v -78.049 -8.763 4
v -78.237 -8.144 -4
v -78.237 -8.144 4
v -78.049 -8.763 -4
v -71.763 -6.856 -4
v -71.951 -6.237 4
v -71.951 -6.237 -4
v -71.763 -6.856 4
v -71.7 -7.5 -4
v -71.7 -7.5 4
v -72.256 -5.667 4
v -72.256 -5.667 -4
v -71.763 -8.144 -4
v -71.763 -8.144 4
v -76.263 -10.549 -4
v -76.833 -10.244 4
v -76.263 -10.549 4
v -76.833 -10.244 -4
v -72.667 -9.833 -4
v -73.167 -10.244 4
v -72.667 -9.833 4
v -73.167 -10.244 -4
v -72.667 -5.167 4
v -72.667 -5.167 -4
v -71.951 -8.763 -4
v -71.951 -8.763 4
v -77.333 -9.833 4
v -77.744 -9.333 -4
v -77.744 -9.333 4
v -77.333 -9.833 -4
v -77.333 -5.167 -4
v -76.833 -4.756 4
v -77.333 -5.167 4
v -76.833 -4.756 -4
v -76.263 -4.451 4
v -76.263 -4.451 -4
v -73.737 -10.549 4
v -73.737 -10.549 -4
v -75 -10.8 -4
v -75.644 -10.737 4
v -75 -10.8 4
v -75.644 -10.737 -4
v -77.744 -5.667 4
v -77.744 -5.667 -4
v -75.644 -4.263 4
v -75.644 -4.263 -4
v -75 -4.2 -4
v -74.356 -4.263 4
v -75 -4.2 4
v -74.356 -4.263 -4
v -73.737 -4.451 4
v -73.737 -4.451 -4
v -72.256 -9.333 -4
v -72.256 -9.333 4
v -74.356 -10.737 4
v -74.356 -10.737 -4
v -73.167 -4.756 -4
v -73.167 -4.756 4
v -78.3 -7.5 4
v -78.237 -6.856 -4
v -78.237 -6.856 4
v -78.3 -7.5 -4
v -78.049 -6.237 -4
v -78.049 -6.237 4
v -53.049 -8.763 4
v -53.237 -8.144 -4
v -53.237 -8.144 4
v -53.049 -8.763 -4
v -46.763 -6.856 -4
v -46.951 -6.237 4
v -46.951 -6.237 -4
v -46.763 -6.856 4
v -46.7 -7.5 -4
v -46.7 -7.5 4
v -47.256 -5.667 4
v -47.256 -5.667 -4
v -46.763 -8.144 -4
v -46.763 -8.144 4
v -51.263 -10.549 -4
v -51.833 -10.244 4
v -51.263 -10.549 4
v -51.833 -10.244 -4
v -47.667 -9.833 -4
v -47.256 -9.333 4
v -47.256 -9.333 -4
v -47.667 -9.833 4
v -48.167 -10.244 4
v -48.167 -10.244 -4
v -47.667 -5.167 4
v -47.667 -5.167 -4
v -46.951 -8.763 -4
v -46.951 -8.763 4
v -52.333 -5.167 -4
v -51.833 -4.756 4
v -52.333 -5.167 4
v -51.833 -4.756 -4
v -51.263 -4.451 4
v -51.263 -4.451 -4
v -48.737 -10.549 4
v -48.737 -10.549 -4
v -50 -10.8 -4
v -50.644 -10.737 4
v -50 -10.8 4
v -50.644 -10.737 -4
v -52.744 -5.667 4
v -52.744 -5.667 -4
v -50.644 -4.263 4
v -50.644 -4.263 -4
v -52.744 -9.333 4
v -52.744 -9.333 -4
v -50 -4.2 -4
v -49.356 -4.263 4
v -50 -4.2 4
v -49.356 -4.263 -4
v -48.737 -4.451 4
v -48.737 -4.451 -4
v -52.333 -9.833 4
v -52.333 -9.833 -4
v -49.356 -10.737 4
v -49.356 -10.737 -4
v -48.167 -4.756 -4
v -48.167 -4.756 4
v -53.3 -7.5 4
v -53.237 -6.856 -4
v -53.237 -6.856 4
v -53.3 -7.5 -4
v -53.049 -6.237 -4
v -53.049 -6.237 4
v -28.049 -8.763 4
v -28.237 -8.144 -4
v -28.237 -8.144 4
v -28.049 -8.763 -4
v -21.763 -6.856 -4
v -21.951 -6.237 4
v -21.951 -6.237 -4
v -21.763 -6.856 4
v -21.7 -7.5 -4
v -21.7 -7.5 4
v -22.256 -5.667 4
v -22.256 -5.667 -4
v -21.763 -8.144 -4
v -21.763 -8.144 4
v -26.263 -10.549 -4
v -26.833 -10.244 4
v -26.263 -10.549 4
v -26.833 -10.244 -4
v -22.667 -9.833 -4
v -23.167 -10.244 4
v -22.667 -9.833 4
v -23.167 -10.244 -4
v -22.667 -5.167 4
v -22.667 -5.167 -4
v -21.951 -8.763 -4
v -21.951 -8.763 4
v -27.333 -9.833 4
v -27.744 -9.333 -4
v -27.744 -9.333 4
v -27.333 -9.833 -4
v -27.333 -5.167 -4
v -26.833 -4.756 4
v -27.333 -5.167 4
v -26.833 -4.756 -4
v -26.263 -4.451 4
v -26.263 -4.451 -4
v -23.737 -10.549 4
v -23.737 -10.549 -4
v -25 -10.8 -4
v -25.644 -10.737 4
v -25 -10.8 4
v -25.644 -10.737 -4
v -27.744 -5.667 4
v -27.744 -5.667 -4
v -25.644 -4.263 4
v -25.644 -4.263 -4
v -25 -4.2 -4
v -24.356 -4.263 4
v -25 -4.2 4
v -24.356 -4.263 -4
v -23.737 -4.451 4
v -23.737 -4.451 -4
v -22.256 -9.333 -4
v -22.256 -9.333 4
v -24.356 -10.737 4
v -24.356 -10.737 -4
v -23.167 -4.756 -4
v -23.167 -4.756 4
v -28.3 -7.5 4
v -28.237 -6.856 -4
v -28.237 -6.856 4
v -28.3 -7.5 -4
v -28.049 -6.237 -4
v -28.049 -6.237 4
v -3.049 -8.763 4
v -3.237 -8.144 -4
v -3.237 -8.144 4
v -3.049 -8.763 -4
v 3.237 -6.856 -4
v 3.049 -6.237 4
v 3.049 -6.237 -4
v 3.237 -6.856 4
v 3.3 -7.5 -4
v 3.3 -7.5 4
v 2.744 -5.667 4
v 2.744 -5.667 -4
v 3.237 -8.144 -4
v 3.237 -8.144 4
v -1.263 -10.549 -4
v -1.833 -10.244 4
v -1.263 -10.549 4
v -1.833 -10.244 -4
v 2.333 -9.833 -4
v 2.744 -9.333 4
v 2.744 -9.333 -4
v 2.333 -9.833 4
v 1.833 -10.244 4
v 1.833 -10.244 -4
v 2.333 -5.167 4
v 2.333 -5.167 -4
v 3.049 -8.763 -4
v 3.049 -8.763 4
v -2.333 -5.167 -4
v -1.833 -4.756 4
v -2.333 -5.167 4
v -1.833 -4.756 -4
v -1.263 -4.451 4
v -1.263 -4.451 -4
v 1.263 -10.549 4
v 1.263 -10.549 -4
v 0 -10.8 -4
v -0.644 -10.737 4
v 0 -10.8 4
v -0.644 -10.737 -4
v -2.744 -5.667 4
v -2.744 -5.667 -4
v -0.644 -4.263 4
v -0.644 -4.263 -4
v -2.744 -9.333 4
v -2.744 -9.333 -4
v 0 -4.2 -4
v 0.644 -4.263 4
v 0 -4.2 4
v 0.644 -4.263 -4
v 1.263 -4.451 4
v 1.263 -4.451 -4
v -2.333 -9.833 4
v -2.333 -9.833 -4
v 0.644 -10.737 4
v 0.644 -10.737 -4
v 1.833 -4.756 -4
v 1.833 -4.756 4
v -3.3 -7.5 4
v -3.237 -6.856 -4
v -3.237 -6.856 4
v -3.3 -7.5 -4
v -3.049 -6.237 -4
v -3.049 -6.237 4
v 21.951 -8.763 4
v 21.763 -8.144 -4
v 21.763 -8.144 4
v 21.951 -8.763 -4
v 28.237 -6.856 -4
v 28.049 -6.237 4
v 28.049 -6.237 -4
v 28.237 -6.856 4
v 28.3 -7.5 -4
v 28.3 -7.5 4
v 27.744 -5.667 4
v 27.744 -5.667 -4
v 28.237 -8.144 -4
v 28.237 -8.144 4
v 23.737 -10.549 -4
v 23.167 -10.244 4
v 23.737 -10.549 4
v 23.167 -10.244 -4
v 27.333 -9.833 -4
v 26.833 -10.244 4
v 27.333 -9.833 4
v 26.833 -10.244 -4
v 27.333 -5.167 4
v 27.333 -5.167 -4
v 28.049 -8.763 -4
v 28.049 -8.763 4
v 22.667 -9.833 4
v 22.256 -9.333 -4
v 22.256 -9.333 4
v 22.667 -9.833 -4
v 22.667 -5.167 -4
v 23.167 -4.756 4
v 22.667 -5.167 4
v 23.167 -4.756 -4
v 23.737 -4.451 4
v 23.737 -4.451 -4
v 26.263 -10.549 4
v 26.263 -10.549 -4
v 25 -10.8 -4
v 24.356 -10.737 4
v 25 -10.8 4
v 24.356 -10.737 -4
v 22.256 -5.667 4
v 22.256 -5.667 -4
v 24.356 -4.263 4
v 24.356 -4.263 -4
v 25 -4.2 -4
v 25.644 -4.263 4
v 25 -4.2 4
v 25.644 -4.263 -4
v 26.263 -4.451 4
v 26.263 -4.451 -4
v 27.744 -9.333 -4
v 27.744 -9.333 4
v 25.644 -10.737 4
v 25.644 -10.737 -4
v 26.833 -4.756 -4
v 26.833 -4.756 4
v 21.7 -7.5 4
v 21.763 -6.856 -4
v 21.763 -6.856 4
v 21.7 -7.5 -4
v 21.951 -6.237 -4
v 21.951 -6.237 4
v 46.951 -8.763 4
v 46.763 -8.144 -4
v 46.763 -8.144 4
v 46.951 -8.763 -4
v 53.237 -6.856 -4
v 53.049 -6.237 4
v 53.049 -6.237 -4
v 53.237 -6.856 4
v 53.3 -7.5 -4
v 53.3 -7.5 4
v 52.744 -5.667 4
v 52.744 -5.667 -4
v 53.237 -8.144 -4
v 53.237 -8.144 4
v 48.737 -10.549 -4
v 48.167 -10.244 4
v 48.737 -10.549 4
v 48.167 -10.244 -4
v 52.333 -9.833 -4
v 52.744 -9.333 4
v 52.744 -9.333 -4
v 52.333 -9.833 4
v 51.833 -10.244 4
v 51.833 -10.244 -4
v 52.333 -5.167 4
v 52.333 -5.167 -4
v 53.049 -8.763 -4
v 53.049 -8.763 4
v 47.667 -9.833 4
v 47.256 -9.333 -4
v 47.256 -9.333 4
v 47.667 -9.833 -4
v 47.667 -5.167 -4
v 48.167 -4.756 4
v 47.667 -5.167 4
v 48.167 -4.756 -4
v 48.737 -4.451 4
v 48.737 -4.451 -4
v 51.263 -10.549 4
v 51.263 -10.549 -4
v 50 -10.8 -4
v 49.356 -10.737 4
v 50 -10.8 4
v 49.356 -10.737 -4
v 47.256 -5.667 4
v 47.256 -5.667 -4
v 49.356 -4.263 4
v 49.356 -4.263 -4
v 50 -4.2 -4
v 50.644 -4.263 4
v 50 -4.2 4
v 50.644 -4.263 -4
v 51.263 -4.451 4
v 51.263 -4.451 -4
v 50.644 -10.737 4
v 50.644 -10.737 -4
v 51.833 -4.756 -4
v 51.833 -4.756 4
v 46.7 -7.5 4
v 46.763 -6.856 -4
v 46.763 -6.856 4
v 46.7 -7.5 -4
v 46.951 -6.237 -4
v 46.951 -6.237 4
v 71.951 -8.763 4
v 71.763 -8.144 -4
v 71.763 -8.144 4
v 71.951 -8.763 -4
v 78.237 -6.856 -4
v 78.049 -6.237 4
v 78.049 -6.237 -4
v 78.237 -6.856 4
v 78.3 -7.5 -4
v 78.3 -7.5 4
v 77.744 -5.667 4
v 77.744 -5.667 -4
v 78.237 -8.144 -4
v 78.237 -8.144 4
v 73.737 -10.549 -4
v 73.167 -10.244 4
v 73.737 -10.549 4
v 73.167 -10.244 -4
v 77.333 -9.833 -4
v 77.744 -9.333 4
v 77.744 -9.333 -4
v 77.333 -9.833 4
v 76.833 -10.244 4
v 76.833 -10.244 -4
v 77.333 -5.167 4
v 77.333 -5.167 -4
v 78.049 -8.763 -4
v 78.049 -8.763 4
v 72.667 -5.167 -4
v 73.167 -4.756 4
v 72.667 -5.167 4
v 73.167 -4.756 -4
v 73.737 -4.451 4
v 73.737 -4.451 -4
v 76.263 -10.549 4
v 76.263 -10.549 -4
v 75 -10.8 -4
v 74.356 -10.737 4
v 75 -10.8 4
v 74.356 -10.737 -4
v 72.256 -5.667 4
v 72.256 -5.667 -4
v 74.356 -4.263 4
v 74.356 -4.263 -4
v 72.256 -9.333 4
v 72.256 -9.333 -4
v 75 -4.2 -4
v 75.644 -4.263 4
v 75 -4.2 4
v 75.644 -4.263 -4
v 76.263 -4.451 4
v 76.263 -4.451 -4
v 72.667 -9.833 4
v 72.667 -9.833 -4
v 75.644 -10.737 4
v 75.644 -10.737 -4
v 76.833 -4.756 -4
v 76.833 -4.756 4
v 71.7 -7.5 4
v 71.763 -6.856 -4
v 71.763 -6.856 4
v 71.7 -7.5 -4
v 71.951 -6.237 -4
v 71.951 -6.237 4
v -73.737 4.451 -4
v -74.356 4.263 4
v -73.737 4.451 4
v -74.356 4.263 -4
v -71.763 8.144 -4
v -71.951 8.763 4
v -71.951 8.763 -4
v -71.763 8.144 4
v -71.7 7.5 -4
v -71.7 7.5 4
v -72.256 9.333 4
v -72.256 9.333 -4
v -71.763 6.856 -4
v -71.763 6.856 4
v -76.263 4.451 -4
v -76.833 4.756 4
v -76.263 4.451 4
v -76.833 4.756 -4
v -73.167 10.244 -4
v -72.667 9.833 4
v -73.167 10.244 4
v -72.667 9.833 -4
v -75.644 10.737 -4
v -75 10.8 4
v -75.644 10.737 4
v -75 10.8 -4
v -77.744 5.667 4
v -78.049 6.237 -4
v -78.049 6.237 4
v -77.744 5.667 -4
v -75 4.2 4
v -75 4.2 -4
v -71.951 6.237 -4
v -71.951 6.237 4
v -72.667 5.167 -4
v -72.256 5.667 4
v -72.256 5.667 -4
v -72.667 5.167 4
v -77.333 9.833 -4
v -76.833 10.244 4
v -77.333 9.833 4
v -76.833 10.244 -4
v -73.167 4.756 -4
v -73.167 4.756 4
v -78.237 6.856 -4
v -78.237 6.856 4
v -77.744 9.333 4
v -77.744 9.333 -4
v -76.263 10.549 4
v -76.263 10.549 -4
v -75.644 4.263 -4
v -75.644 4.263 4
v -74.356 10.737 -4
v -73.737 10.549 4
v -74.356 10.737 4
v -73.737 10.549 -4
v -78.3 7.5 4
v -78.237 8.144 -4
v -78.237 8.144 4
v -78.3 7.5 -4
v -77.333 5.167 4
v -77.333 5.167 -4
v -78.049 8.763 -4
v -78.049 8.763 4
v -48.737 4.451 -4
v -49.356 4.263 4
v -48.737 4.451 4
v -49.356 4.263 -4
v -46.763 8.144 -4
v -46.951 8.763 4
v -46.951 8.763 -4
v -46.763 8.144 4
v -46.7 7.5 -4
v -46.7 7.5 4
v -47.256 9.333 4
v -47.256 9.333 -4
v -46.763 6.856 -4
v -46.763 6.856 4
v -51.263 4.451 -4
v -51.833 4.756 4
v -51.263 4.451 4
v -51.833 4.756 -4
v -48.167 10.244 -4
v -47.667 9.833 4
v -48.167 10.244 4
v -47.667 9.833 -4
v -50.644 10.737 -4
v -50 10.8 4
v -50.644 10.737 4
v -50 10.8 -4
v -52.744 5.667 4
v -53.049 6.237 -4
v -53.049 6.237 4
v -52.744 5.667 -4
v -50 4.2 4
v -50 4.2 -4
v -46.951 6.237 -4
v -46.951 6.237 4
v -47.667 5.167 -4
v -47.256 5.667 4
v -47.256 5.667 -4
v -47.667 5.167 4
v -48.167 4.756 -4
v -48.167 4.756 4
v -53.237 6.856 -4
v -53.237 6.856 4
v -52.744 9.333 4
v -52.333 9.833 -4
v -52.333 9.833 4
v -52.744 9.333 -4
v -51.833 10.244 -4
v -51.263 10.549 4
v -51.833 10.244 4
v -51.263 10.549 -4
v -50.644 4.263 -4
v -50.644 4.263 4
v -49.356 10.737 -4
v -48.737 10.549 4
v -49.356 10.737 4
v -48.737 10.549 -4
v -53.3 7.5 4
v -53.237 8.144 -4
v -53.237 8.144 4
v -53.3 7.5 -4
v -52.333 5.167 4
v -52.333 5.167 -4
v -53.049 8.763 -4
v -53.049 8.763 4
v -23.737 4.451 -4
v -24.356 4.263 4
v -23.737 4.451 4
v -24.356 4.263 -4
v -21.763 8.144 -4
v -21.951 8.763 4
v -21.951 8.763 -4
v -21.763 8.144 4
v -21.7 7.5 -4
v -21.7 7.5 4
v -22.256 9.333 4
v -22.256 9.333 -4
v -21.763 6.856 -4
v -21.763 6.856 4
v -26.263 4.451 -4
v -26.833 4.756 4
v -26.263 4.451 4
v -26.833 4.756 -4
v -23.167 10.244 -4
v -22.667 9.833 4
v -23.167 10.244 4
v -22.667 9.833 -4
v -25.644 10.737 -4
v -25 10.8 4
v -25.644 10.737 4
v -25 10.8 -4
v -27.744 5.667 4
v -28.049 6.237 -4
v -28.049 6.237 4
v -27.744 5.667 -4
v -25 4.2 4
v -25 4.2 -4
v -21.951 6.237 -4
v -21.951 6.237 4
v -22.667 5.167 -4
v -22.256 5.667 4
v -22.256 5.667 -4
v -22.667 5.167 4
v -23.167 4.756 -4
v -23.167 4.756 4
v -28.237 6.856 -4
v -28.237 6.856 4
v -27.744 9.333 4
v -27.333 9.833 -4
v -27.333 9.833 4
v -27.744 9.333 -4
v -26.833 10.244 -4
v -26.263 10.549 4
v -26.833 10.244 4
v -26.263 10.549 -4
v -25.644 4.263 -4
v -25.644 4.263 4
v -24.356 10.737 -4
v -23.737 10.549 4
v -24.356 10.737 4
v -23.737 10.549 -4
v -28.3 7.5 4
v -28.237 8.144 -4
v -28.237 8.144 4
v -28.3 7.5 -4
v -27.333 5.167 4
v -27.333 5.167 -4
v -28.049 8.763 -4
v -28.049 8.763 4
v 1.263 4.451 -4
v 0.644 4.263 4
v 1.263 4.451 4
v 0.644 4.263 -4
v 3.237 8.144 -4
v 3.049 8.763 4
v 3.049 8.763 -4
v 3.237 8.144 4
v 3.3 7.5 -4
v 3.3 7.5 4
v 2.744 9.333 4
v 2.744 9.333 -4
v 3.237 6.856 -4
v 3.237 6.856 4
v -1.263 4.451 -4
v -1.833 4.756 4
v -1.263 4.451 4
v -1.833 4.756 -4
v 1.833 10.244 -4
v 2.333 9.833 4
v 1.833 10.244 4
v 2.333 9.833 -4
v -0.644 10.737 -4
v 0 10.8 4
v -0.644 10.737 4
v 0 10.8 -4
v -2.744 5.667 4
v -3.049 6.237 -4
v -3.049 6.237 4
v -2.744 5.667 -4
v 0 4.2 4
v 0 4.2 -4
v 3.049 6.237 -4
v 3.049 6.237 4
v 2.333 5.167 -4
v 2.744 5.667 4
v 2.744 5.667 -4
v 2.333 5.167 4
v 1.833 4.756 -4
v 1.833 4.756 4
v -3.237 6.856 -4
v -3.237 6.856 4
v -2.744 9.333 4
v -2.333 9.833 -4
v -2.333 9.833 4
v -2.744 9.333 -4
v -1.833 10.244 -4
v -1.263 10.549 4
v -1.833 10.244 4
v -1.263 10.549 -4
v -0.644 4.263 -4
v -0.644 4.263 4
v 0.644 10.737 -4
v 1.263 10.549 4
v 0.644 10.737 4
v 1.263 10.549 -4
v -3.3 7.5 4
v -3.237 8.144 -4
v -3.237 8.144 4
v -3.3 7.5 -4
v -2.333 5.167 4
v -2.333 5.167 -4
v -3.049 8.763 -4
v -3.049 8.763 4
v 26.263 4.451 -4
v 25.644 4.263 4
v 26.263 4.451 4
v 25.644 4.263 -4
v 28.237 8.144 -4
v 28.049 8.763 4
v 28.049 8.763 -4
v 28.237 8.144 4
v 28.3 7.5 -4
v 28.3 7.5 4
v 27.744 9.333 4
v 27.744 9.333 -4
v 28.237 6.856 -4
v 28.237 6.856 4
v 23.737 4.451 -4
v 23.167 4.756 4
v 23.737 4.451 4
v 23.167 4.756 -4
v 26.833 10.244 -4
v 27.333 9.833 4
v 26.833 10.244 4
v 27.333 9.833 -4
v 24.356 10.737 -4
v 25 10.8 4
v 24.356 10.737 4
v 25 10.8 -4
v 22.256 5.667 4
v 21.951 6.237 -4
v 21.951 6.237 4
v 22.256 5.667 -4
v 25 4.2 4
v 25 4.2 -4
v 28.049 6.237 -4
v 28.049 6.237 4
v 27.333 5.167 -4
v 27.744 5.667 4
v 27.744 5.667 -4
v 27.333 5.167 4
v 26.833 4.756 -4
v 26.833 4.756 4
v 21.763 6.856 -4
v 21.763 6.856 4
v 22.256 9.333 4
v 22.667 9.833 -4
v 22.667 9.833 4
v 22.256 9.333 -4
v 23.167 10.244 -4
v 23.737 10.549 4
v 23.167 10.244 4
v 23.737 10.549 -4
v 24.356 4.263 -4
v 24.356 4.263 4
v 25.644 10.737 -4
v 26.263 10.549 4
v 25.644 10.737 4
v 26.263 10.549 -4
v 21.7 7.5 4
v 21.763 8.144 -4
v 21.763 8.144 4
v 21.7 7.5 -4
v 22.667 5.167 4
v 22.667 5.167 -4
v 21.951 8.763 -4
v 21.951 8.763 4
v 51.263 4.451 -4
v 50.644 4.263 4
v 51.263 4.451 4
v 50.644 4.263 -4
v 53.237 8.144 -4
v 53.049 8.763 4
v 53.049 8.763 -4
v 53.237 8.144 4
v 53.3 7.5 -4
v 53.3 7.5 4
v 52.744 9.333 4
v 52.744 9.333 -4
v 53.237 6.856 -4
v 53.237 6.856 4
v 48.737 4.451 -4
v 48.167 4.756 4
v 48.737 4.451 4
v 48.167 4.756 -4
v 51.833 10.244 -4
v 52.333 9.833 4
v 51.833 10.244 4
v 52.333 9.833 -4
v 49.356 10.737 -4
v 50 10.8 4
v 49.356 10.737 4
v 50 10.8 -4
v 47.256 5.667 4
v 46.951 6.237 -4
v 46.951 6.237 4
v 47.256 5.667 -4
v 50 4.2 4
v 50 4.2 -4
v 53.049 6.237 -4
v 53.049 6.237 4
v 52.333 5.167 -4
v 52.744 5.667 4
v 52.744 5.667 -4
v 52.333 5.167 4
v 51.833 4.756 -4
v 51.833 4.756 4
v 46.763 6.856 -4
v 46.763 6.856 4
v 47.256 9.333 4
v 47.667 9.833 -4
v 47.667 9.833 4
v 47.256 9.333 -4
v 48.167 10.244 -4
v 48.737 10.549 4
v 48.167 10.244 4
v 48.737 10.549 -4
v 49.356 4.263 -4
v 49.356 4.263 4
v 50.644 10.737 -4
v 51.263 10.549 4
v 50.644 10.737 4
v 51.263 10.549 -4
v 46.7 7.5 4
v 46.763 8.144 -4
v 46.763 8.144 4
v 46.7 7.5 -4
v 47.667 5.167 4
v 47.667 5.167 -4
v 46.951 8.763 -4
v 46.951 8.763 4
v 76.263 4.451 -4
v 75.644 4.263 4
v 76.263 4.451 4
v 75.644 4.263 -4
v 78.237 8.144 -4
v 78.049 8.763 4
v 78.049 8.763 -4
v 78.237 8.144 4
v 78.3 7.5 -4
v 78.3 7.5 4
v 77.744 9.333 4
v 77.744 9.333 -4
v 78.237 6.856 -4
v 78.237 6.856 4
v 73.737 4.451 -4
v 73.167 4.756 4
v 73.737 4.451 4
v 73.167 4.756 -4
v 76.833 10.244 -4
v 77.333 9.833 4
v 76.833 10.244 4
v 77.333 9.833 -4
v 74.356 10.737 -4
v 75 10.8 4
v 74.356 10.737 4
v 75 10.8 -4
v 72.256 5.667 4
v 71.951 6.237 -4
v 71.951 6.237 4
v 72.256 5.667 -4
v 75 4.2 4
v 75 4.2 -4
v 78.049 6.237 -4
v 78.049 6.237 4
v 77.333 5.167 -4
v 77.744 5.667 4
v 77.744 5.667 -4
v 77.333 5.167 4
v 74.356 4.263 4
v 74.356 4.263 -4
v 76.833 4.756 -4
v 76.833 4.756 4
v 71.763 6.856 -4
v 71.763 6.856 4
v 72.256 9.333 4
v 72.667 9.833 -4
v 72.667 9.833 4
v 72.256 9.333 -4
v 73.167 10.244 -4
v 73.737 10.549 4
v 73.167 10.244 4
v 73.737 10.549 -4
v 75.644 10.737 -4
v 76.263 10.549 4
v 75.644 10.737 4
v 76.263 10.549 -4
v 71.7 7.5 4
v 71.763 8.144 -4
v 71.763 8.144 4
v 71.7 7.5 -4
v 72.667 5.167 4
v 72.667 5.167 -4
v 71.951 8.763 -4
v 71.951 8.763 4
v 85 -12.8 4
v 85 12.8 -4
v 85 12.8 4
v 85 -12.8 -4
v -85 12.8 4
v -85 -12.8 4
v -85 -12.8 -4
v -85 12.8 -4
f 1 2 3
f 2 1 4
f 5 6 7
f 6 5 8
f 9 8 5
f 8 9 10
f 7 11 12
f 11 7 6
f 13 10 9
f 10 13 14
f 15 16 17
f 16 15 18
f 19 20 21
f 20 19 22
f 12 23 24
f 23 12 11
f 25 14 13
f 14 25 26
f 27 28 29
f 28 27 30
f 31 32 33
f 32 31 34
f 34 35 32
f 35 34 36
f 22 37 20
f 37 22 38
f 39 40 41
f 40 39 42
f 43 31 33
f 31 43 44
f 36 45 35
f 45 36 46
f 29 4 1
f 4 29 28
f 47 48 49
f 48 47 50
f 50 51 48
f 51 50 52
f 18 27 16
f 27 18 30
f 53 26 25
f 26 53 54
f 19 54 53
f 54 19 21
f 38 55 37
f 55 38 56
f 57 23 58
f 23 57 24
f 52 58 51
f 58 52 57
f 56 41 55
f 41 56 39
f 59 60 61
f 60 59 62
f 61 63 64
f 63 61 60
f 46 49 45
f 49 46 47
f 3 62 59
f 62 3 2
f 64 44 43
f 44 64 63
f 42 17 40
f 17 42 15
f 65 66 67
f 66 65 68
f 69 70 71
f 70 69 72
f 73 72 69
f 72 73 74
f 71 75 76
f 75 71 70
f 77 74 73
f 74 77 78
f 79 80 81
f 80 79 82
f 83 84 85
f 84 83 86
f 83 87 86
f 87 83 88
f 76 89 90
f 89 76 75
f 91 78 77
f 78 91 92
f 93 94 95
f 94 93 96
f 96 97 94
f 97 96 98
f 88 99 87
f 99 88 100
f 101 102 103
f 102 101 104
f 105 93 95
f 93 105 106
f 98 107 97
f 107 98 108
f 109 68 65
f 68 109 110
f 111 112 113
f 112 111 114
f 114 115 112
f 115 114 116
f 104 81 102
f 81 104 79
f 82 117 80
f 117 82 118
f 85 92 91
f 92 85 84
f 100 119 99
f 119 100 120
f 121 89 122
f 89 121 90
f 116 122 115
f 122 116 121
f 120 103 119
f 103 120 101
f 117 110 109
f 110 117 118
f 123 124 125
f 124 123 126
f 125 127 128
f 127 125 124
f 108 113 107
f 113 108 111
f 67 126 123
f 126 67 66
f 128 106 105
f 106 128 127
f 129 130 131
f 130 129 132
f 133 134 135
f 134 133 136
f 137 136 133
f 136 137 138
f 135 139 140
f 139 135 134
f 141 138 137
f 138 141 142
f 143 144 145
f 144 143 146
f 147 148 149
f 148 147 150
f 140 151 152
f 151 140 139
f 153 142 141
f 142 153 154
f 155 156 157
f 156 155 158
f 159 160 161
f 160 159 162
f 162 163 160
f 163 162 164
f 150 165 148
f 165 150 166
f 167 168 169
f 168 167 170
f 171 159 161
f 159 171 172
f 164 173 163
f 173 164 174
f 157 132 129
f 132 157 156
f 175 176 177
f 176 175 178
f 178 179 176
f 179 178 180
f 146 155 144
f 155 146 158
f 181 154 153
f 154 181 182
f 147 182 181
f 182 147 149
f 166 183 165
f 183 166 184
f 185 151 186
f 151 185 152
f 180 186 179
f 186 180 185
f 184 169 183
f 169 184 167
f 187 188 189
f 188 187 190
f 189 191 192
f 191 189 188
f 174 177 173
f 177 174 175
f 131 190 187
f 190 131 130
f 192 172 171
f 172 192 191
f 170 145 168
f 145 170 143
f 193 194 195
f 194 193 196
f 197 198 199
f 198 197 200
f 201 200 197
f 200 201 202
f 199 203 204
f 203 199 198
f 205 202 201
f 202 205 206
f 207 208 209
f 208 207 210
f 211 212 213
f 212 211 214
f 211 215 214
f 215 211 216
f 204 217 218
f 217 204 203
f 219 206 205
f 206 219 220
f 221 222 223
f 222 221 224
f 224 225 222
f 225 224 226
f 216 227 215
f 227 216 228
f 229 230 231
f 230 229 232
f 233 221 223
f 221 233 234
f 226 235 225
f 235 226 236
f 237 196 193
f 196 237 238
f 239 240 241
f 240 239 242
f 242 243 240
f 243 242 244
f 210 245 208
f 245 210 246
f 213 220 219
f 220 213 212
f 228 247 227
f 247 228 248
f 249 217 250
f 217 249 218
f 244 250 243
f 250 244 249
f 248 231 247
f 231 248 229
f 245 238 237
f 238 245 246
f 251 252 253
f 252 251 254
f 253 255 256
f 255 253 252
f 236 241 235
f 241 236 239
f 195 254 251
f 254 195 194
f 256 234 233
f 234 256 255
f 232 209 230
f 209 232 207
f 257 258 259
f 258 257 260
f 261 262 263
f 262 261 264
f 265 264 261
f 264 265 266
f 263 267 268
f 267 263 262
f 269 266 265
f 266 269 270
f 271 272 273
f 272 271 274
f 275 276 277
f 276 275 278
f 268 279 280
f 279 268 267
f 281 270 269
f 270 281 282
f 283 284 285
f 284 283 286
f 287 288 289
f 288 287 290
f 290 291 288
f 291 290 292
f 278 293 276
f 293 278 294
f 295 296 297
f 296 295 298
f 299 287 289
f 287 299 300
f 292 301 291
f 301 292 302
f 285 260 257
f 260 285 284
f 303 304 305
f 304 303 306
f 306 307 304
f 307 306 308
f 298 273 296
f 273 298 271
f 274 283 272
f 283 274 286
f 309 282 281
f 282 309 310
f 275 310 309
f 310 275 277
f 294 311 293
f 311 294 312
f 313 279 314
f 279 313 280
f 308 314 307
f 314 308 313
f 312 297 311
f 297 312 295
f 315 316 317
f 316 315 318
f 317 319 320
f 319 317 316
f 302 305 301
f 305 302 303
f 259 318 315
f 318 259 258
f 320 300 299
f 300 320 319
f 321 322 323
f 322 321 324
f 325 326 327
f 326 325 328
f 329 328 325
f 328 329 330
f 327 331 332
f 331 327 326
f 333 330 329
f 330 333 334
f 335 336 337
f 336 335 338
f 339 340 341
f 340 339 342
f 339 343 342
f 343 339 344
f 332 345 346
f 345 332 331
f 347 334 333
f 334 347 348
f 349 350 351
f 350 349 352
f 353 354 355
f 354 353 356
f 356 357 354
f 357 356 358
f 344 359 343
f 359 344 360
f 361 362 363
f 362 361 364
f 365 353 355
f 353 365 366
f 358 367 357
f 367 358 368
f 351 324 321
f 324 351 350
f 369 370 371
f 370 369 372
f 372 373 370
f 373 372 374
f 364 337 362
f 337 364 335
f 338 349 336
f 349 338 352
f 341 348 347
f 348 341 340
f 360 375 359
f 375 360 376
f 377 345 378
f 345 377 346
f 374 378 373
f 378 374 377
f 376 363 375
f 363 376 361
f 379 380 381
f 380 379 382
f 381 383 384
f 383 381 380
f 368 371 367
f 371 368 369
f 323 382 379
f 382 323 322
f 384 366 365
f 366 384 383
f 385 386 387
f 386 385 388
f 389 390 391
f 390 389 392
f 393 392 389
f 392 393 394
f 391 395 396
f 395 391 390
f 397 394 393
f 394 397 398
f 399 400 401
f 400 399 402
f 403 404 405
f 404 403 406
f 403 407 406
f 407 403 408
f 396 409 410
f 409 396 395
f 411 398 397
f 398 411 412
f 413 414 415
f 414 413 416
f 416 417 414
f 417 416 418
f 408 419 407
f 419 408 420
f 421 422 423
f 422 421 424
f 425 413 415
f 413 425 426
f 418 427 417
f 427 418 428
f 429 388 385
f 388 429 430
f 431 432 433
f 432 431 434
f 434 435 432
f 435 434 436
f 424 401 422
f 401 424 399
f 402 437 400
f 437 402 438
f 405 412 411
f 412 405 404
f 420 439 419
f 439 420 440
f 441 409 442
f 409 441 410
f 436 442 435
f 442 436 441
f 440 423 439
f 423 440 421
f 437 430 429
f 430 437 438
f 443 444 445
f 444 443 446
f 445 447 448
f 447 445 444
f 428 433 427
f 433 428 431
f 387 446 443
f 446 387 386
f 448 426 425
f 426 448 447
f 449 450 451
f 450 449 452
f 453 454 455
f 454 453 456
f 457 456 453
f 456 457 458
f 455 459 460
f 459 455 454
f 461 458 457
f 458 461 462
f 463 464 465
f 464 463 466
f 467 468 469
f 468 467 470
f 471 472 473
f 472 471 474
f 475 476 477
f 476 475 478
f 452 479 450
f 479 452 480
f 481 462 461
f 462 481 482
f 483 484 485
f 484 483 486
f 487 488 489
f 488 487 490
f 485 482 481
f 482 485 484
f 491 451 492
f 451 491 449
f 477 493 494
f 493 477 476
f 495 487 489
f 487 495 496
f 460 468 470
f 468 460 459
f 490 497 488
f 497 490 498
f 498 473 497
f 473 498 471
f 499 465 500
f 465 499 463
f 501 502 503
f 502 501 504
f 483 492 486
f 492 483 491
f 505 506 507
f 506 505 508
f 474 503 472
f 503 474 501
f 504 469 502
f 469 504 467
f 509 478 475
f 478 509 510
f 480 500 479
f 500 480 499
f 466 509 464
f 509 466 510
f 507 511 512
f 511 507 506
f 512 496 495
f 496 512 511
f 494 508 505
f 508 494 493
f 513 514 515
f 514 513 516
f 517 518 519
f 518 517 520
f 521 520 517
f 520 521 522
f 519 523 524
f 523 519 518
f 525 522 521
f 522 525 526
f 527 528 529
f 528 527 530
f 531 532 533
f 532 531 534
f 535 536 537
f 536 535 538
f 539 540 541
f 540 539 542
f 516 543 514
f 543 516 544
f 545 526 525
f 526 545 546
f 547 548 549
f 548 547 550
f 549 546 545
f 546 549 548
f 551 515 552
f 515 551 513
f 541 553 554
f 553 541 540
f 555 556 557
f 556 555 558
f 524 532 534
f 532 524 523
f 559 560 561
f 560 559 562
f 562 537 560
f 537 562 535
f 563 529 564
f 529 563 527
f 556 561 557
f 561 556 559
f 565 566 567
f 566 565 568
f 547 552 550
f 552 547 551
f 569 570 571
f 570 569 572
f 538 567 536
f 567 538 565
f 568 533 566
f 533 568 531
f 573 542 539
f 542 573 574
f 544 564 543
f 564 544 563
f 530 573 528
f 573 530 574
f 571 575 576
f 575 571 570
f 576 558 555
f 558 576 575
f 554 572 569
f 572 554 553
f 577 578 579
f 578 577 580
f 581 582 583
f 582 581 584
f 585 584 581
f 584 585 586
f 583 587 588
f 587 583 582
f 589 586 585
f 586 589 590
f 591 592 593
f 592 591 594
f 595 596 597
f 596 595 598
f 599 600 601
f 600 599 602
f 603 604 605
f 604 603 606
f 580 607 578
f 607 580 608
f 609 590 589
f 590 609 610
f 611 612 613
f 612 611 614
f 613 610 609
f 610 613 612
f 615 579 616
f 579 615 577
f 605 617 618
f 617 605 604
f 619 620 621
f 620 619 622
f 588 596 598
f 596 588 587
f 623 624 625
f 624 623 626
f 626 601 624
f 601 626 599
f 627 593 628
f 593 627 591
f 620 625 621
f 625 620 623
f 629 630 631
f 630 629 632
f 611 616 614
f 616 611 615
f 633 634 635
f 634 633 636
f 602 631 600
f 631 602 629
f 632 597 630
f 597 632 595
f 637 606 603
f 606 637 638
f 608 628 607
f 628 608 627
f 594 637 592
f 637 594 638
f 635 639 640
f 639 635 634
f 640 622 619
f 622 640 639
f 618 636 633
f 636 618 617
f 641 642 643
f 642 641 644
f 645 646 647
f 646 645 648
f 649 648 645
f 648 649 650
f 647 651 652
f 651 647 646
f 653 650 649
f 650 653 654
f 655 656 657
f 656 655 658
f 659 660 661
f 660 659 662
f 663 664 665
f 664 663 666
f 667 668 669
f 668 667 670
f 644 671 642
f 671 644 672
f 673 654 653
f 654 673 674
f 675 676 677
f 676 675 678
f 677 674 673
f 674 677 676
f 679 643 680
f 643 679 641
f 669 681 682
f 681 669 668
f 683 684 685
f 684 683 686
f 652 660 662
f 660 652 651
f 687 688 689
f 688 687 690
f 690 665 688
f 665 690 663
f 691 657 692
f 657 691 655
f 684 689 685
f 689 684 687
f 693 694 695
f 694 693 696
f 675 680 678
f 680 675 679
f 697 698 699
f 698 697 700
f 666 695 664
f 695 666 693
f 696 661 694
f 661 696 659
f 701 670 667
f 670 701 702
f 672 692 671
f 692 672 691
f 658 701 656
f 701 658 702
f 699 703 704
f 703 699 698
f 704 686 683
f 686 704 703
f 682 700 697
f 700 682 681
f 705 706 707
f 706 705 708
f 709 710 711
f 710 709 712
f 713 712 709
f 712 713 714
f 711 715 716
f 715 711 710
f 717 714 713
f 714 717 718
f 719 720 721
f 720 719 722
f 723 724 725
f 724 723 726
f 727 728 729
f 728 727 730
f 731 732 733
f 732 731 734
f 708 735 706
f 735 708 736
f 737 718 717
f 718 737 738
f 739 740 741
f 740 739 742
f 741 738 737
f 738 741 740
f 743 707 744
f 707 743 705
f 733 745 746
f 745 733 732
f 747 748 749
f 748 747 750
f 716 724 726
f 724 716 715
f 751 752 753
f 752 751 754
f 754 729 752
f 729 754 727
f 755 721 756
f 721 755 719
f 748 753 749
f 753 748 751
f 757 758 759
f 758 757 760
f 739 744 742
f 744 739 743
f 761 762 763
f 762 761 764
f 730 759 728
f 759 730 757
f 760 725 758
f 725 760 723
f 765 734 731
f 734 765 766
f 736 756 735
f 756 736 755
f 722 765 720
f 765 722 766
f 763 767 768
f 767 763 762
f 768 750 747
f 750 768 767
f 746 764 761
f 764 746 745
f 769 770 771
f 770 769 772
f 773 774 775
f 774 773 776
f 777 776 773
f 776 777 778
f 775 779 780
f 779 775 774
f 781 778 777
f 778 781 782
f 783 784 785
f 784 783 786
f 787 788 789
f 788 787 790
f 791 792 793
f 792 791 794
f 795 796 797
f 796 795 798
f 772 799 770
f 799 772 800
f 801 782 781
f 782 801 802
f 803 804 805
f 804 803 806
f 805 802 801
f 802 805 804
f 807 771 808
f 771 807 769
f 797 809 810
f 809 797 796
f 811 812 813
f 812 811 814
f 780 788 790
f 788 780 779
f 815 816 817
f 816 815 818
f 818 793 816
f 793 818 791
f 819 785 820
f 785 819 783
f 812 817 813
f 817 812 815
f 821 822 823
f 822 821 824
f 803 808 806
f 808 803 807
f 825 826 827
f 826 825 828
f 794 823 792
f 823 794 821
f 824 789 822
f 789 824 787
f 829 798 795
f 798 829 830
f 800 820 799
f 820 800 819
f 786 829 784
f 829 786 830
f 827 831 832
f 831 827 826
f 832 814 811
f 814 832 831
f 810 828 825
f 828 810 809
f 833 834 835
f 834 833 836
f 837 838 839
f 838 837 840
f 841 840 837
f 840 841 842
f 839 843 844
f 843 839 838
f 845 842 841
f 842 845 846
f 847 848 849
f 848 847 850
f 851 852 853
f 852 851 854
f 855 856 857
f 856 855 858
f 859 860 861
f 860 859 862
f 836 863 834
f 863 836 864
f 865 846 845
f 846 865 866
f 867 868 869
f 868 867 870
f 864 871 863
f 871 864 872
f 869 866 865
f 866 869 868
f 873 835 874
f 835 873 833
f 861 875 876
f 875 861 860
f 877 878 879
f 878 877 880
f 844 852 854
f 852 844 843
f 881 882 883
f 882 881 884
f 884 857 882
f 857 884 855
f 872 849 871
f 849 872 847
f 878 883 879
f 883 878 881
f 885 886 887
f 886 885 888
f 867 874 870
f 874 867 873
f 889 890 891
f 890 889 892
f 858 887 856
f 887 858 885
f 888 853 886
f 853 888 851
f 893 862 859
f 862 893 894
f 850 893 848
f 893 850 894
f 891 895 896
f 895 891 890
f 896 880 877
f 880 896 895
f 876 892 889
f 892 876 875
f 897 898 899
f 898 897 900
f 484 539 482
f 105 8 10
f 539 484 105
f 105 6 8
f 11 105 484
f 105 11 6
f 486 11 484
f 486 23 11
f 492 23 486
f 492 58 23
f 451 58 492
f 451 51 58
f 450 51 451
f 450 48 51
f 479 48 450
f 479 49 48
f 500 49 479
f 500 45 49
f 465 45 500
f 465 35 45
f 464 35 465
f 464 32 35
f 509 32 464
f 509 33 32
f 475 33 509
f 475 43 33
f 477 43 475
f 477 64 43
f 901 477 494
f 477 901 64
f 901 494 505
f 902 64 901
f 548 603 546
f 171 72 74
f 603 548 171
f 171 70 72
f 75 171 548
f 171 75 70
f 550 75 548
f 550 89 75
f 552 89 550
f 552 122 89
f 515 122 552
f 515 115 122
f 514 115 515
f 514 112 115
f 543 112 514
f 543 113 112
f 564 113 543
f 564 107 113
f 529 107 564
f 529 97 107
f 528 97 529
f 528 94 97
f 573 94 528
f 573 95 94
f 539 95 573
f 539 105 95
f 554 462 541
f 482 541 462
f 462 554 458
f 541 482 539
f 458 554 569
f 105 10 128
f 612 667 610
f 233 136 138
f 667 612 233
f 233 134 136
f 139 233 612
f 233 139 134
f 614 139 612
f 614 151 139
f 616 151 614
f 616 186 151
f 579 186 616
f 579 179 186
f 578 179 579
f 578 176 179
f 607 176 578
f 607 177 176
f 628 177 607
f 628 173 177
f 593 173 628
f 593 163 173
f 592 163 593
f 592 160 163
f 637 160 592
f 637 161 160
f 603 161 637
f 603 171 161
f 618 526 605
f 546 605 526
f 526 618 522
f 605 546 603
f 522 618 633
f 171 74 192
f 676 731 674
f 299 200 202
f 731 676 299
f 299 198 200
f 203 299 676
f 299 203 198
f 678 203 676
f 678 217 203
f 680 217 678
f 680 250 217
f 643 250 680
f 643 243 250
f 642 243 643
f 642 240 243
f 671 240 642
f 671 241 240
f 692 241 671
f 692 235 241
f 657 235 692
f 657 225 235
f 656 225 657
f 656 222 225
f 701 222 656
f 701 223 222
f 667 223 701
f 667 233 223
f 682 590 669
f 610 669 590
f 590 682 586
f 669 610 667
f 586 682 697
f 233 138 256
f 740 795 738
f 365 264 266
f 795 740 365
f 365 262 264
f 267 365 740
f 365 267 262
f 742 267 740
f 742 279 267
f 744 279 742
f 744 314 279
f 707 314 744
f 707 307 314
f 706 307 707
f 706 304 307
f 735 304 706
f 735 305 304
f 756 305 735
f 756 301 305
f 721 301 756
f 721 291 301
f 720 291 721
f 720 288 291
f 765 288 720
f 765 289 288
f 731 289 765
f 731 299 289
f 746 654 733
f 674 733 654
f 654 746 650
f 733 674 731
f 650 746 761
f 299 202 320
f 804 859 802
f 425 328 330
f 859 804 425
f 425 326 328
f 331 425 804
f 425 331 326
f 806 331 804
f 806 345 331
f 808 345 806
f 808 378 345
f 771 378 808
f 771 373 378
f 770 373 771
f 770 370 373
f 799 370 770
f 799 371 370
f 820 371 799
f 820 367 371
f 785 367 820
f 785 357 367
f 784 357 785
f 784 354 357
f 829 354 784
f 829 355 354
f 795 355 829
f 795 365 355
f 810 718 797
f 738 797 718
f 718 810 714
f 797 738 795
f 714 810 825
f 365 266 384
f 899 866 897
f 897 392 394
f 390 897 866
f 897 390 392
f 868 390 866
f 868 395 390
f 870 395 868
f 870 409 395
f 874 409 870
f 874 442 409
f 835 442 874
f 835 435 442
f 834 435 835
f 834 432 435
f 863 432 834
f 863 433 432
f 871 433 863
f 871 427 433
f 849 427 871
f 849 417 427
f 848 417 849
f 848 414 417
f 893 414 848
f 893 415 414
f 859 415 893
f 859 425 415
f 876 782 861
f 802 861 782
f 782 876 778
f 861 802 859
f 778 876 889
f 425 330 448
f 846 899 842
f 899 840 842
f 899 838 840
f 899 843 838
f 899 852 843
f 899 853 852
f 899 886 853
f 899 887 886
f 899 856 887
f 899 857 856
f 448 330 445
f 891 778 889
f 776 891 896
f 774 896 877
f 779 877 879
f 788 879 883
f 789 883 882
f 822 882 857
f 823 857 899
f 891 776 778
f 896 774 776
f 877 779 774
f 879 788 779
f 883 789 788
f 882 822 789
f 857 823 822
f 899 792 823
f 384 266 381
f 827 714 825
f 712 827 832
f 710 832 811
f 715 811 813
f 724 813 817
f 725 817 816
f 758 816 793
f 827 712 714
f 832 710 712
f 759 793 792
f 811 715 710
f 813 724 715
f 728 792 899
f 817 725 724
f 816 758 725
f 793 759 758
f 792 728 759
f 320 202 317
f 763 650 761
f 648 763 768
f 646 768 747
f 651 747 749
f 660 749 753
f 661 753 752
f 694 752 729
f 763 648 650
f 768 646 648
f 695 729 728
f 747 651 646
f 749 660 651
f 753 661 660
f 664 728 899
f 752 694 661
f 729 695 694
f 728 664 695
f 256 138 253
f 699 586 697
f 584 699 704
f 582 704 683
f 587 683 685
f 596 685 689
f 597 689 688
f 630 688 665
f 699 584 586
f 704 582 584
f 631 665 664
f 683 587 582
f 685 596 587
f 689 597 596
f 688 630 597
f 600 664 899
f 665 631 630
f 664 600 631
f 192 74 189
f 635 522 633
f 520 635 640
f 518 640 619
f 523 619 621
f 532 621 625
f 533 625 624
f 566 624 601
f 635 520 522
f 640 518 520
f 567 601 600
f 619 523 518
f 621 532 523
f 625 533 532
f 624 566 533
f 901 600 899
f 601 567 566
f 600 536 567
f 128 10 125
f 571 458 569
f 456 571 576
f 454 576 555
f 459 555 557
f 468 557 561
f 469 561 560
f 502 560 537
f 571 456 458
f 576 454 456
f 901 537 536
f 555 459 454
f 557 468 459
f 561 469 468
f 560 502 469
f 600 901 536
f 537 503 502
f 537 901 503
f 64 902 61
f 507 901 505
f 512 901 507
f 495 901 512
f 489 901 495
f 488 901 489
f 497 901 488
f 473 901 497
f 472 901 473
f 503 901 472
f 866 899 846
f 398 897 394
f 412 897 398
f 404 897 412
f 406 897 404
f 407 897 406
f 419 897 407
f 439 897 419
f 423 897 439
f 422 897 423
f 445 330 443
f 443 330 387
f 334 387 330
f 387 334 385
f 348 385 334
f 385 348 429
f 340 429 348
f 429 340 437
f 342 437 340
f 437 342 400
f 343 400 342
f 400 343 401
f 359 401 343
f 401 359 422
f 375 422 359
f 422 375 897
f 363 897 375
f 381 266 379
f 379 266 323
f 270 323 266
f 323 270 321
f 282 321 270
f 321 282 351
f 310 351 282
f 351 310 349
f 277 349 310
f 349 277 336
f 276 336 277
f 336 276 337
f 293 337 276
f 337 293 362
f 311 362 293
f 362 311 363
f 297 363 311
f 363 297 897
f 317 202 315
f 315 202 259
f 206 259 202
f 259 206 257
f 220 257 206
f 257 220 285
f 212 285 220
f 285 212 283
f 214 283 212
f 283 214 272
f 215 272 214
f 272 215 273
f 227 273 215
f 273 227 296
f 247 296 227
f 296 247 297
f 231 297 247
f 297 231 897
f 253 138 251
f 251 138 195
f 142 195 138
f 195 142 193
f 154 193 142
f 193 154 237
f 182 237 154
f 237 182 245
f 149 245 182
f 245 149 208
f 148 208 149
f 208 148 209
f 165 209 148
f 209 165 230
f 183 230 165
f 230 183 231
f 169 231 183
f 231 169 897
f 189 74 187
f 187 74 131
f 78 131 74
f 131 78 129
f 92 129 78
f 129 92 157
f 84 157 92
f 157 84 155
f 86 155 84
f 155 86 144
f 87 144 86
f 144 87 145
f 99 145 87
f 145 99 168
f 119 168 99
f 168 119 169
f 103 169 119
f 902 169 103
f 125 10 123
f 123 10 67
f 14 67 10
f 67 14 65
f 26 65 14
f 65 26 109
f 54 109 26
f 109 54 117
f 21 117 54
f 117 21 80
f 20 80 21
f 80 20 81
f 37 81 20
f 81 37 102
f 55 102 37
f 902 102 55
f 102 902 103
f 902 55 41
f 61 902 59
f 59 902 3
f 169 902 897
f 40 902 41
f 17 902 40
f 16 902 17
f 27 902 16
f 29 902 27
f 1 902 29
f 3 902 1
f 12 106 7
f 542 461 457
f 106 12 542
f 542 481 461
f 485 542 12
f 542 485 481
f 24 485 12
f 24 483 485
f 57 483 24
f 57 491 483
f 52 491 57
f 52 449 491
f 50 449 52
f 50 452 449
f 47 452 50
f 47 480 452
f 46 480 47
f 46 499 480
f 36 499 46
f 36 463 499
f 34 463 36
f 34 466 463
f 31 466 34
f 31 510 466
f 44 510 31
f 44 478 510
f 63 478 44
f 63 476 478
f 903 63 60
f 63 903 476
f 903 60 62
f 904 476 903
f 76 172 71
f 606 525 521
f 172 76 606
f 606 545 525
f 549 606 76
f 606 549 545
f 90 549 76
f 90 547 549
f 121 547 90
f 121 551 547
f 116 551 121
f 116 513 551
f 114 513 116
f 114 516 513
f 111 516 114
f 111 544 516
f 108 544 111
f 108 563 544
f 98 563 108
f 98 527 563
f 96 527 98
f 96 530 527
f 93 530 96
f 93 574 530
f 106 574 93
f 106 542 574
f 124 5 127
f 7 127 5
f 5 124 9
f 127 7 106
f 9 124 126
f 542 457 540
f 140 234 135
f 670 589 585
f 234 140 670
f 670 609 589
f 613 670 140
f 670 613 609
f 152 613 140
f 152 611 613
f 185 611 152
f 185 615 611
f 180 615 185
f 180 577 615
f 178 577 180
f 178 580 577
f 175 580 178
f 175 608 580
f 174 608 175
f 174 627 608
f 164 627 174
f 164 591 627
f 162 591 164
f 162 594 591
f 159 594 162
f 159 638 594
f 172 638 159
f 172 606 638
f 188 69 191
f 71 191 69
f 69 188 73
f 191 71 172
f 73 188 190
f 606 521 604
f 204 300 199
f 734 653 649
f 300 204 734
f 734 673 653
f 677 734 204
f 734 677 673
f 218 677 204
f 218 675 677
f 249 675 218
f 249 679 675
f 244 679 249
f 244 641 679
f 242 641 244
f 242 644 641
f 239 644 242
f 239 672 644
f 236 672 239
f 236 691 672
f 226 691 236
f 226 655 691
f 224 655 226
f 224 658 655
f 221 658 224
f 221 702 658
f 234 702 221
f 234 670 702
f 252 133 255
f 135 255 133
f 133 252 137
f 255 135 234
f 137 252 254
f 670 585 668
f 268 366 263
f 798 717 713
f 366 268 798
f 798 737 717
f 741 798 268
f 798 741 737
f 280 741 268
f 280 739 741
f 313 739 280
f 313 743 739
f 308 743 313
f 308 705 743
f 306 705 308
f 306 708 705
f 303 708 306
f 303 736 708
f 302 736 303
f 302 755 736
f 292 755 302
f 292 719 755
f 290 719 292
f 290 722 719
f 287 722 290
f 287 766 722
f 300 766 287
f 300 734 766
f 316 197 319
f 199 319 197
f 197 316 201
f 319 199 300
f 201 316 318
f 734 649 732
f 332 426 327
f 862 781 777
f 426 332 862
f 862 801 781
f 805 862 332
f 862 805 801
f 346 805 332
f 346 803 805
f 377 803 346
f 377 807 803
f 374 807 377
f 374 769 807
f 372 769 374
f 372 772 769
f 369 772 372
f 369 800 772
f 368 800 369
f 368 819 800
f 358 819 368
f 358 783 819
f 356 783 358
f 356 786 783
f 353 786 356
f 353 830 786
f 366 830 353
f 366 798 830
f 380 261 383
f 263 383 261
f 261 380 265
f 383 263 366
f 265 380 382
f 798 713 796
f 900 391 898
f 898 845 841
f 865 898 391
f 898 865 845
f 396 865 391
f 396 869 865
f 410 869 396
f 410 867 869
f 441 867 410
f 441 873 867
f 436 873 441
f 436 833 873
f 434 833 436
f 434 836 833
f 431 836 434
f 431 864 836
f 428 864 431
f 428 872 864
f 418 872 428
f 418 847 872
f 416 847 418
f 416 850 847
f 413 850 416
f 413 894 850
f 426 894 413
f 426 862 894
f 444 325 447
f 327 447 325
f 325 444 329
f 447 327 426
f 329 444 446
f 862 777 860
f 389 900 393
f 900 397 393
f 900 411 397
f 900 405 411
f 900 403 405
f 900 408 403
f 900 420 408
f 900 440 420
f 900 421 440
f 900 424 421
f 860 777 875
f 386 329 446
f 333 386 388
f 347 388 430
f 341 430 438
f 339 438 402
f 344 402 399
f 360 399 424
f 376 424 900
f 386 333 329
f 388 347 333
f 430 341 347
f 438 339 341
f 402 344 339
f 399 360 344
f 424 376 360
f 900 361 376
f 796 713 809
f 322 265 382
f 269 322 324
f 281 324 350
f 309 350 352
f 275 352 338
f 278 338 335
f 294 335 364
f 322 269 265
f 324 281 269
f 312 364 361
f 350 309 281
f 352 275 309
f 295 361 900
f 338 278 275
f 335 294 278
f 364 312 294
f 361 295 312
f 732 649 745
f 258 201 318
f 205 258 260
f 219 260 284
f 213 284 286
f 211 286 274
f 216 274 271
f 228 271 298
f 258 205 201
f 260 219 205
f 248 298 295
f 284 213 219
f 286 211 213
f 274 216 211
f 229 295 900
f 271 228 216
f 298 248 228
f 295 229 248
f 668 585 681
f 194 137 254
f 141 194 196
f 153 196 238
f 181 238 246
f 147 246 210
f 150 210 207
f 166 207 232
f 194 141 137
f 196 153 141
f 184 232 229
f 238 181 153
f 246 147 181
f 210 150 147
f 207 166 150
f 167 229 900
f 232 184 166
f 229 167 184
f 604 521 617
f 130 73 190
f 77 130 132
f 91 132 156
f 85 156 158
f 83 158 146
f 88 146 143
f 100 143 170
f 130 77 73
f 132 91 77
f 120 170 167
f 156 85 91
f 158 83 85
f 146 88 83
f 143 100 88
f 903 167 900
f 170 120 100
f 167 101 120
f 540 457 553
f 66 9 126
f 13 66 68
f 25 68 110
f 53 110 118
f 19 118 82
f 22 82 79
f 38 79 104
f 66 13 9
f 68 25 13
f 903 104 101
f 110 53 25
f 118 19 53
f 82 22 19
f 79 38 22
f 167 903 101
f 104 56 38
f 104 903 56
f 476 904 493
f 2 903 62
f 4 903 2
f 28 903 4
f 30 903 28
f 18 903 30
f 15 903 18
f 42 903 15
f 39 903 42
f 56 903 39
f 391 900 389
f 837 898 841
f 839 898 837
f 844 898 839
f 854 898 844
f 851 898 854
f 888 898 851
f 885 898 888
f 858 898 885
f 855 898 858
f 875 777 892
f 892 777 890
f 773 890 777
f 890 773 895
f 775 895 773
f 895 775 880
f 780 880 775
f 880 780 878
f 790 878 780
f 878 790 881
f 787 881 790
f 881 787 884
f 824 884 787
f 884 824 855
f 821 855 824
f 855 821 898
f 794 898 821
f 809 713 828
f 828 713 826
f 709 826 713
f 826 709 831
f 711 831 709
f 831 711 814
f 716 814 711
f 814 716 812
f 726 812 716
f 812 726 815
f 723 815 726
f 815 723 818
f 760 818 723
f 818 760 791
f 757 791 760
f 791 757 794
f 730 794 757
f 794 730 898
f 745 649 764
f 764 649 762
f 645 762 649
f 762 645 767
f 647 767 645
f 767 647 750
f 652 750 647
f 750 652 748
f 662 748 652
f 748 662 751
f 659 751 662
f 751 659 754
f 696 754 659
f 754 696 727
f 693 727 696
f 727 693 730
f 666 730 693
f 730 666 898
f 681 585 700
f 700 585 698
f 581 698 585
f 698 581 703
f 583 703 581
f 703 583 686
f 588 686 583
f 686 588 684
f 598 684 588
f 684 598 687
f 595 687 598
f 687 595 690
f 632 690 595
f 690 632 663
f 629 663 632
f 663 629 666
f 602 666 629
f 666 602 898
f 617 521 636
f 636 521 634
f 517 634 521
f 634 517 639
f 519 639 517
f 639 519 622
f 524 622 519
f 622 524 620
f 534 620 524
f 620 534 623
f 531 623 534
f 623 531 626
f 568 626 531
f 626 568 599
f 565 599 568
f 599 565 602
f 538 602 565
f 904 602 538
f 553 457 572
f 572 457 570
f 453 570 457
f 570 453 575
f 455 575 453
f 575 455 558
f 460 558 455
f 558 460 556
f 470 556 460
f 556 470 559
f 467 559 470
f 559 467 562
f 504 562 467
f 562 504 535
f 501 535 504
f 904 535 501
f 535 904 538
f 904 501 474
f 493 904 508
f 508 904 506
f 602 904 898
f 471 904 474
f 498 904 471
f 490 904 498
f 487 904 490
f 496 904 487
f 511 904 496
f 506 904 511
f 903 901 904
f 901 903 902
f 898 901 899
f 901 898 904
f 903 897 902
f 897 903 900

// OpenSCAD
$fn = 32;

// ----------------------------------------------------------------------
// Hole bar, 7 x Ø6.6
// tworows layout, 10 mm edge offset
// ----------------------------------------------------------------------

// --- parameters (mm) ---
bar_w = 25.6;     // bar width (Y)
bar_t = 8;        // bar thickness (Z)
holes = 7;        // holes per row
hole_d = 6.6;     // hole diameter
edge = 10;        // offset from the bar end to the first hole
pitch = 25;       // pitch between neighbouring holes
row_offset = 15;  // distance between the two rows

// --- derived feature positions (mm) ---
span = (holes - 1) * pitch;   // = 150   distance between the end holes
bar_l = span + 2 * edge;      // = 170   overall bar length
start_x = -bar_l / 2 + edge;  // = -75   X of the first hole
feature_centers = [
  [start_x + 0 * pitch, -row_offset / 2],
  [start_x + 1 * pitch, -row_offset / 2],
  [start_x + 2 * pitch, -row_offset / 2],
  [start_x + 3 * pitch, -row_offset / 2],
  [start_x + 4 * pitch, -row_offset / 2],
  [start_x + 5 * pitch, -row_offset / 2],
  [start_x + 6 * pitch, -row_offset / 2]
];   // hole centres of the first row
row2_centers = [
  [start_x + 0 * pitch, row_offset / 2],
  [start_x + 1 * pitch, row_offset / 2],
  [start_x + 2 * pitch, row_offset / 2],
  [start_x + 3 * pitch, row_offset / 2],
  [start_x + 4 * pitch, row_offset / 2],
  [start_x + 5 * pitch, row_offset / 2],
  [start_x + 6 * pitch, row_offset / 2]
];   // hole centres of the second row

// bar with two rows of holes, both read from their own centre arrays
difference() {
  translate([-bar_l / 2, -bar_w / 2, -bar_t / 2]) cube([bar_l, bar_w, bar_t]);
  for (centre = feature_centers)
    translate([centre[0], centre[1], 0])
      cylinder(d = hole_d, h = bar_t + 2, center = true);
  for (centre = row2_centers)
    translate([centre[0], centre[1], 0])
      cylinder(d = hole_d, h = bar_t + 2, center = true);
}
